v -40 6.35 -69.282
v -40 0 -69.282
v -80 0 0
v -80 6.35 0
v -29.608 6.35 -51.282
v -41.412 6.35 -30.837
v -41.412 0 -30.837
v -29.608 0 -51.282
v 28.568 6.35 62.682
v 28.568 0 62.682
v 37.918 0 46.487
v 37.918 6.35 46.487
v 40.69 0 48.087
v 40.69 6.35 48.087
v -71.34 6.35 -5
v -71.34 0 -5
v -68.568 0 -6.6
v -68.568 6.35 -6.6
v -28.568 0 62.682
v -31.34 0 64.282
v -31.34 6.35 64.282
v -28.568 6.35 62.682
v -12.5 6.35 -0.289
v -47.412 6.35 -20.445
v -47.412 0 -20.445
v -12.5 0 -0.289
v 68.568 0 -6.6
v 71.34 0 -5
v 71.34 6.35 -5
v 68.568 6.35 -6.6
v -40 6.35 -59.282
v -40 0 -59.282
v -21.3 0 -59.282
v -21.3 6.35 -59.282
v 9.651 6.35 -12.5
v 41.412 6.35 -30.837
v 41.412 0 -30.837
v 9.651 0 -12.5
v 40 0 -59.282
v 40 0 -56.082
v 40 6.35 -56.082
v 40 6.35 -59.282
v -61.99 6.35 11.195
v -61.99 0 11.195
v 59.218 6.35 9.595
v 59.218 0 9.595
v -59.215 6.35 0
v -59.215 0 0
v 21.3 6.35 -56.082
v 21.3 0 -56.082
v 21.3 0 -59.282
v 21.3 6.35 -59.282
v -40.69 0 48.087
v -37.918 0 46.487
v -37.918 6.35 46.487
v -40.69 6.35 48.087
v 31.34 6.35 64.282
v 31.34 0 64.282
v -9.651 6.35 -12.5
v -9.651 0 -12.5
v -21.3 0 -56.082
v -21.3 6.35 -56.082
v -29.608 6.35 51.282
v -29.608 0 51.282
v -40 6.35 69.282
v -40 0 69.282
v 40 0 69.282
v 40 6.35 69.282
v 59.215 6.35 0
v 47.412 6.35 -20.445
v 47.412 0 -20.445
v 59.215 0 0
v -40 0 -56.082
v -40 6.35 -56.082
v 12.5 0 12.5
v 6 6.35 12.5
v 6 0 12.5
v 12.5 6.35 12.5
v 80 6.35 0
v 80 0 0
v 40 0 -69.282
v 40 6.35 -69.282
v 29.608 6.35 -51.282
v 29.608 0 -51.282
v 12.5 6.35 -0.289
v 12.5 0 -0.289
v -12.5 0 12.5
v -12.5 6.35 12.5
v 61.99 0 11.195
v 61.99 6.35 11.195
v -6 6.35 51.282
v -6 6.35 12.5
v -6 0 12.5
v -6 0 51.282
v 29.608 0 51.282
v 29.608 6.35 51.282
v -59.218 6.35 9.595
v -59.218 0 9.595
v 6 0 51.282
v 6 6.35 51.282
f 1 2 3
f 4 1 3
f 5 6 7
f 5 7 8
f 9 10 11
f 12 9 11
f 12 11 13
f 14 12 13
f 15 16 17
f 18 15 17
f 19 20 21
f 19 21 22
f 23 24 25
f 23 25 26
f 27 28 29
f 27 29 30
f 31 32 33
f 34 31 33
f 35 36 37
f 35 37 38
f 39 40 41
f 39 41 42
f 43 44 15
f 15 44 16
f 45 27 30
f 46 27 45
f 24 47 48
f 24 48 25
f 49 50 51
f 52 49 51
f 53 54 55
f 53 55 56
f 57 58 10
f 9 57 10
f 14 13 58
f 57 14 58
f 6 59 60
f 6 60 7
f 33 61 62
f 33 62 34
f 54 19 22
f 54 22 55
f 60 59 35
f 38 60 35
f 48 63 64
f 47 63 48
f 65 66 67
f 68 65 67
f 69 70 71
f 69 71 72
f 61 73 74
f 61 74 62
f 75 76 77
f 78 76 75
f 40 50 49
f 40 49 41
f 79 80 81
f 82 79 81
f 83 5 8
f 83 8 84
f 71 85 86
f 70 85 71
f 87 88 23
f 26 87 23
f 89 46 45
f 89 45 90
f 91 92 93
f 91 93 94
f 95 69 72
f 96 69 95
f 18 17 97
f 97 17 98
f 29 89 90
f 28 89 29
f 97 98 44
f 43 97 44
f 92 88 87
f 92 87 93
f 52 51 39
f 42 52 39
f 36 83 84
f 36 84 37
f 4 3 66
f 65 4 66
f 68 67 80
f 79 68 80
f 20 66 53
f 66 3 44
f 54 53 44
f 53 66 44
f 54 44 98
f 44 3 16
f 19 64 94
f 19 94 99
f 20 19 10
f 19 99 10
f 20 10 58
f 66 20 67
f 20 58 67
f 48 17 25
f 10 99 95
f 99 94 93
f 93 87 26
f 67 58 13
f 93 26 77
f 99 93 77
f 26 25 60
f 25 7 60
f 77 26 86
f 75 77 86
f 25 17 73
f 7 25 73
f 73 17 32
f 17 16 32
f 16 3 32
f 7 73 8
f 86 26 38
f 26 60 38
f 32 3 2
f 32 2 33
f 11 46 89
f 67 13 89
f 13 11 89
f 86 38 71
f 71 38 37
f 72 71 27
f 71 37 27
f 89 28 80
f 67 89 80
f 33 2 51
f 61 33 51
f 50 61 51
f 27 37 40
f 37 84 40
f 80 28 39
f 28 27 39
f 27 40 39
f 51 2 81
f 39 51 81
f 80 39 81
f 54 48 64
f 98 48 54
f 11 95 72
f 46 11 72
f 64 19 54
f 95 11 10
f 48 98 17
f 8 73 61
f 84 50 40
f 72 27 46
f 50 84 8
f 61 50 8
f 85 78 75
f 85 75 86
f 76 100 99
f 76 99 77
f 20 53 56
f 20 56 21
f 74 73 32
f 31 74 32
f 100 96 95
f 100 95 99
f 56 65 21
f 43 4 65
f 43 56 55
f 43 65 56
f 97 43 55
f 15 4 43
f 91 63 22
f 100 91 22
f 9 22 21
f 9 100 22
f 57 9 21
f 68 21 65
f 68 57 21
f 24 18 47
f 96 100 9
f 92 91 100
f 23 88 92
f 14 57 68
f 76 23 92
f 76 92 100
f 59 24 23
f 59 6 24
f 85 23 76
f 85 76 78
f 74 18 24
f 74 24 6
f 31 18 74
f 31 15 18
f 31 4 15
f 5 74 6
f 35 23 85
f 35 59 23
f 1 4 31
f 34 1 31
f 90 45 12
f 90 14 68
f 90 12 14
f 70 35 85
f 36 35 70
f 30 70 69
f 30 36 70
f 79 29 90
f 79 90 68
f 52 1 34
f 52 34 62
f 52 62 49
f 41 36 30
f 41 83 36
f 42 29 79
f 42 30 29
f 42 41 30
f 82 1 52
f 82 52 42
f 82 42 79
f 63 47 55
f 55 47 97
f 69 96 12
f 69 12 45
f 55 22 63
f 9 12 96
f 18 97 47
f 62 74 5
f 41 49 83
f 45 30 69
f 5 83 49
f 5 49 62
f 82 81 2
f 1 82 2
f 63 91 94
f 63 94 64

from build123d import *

# Parameters (mm, degrees)
SKETCH1_W           = 18.7
SKETCH1_H           = 3.2
BOSS_EXTRUDE1_DEPTH = 6.35
CUT_EXTRUDE1_DEPTH  = 6.35
BOSS_EXTRUDE2_DEPTH = 6.35
SKETCH4_W           = 25
SKETCH4_H           = 25
BOSS_EXTRUDE3_DEPTH = 6.35


with BuildPart() as part:
    # Sketch1 → Boss-Extrude1 (new body)
    with BuildSketch(Plane(origin=(0, 0, 0), x_dir=(1, 0, 0), z_dir=(0, 1, 0))):
        Polygon((40, -69.282032303), (80, 0), (40, 69.282032303), (-40, 69.282032303), (-80, 0), (-40, -69.282032303), align=None)
        Polygon((-68.56846467, 6.6), (-59.21846467, -9.594675051), (-61.989745962, -11.194675051), (-71.339745962, 5), align=None, mode=Mode.SUBTRACT)
        Polygon((-31.339745962, -64.282032303), (-28.56846467, -62.682032303), (-37.91846467, -46.487357252), (-40.689745962, -48.087357252), align=None, mode=Mode.SUBTRACT)
        Polygon((28.56846467, -62.682032303), (37.91846467, -46.487357252), (40.689745962, -48.087357252), (31.339745962, -64.282032303), align=None, mode=Mode.SUBTRACT)
        Polygon((71.339745962, 5), (68.56846467, 6.6), (59.21846467, -9.594675051), (61.989745962, -11.194675051), align=None, mode=Mode.SUBTRACT)
        with Locations((30.65, 57.682032303)):
            Rectangle(SKETCH1_W, SKETCH1_H, mode=Mode.SUBTRACT)
        with Locations((-30.65, 57.682032303)):
            Rectangle(SKETCH1_W, SKETCH1_H, mode=Mode.SUBTRACT)
    extrude(amount=BOSS_EXTRUDE1_DEPTH)

    # Sketch2 → Cut-Extrude1 (cut)
    with BuildSketch(Plane(origin=(0, 6.35, 0), x_dir=(1, 0, 0), z_dir=(0, 1, 0))):
        Polygon((-59.215390309, 0), (-29.607695155, 51.282032303), (29.607695155, 51.282032303), (59.215390309, 0), (29.607695155, -51.282032303), (-29.607695155, -51.282032303), align=None)
    extrude(amount=-CUT_EXTRUDE1_DEPTH, mode=Mode.SUBTRACT)

    # Sketch3 → Boss-Extrude2 (add)
    with BuildSketch(Plane(origin=(0, 6.35, 0), x_dir=(1, 0, 0), z_dir=(0, 1, 0))):
        Polygon((-6, -3.464101615), (-6, -51.282032303), (6, -51.282032303), (6, -3.464101615), (3, -5.196152423), (0, 0), (-3, -5.196152423), align=None)
        Polygon((6, 0), (6, -3.464101615), (47.411542732, 20.444863729), (41.411542732, 30.837168574), (0, 6.92820323), (3, 5.196152423), (0, 0), align=None)
        Polygon((-47.411542732, 20.444863729), (-6, -3.464101615), (-6, 0), (0, 0), (-3, 5.196152423), (0, 6.92820323), (-41.411542732, 30.837168574), align=None)
        Polygon((-3, 5.196152423), (0, 0), (3, 5.196152423), (0, 6.92820323), align=None)
        Polygon((3, -5.196152423), (6, -3.464101615), (6, 0), (0, 0), align=None)
        Polygon((-6, 0), (-6, -3.464101615), (-3, -5.196152423), (0, 0), align=None)
    extrude(amount=-BOSS_EXTRUDE2_DEPTH)

    # Sketch4 → Boss-Extrude3 (add)
    with BuildSketch(Plane(origin=(0, 6.35, 0), x_dir=(1, 0, 0), z_dir=(0, 1, 0))):
        Rectangle(SKETCH4_W, SKETCH4_H)
    extrude(amount=-BOSS_EXTRUDE3_DEPTH)


solid = part.part
